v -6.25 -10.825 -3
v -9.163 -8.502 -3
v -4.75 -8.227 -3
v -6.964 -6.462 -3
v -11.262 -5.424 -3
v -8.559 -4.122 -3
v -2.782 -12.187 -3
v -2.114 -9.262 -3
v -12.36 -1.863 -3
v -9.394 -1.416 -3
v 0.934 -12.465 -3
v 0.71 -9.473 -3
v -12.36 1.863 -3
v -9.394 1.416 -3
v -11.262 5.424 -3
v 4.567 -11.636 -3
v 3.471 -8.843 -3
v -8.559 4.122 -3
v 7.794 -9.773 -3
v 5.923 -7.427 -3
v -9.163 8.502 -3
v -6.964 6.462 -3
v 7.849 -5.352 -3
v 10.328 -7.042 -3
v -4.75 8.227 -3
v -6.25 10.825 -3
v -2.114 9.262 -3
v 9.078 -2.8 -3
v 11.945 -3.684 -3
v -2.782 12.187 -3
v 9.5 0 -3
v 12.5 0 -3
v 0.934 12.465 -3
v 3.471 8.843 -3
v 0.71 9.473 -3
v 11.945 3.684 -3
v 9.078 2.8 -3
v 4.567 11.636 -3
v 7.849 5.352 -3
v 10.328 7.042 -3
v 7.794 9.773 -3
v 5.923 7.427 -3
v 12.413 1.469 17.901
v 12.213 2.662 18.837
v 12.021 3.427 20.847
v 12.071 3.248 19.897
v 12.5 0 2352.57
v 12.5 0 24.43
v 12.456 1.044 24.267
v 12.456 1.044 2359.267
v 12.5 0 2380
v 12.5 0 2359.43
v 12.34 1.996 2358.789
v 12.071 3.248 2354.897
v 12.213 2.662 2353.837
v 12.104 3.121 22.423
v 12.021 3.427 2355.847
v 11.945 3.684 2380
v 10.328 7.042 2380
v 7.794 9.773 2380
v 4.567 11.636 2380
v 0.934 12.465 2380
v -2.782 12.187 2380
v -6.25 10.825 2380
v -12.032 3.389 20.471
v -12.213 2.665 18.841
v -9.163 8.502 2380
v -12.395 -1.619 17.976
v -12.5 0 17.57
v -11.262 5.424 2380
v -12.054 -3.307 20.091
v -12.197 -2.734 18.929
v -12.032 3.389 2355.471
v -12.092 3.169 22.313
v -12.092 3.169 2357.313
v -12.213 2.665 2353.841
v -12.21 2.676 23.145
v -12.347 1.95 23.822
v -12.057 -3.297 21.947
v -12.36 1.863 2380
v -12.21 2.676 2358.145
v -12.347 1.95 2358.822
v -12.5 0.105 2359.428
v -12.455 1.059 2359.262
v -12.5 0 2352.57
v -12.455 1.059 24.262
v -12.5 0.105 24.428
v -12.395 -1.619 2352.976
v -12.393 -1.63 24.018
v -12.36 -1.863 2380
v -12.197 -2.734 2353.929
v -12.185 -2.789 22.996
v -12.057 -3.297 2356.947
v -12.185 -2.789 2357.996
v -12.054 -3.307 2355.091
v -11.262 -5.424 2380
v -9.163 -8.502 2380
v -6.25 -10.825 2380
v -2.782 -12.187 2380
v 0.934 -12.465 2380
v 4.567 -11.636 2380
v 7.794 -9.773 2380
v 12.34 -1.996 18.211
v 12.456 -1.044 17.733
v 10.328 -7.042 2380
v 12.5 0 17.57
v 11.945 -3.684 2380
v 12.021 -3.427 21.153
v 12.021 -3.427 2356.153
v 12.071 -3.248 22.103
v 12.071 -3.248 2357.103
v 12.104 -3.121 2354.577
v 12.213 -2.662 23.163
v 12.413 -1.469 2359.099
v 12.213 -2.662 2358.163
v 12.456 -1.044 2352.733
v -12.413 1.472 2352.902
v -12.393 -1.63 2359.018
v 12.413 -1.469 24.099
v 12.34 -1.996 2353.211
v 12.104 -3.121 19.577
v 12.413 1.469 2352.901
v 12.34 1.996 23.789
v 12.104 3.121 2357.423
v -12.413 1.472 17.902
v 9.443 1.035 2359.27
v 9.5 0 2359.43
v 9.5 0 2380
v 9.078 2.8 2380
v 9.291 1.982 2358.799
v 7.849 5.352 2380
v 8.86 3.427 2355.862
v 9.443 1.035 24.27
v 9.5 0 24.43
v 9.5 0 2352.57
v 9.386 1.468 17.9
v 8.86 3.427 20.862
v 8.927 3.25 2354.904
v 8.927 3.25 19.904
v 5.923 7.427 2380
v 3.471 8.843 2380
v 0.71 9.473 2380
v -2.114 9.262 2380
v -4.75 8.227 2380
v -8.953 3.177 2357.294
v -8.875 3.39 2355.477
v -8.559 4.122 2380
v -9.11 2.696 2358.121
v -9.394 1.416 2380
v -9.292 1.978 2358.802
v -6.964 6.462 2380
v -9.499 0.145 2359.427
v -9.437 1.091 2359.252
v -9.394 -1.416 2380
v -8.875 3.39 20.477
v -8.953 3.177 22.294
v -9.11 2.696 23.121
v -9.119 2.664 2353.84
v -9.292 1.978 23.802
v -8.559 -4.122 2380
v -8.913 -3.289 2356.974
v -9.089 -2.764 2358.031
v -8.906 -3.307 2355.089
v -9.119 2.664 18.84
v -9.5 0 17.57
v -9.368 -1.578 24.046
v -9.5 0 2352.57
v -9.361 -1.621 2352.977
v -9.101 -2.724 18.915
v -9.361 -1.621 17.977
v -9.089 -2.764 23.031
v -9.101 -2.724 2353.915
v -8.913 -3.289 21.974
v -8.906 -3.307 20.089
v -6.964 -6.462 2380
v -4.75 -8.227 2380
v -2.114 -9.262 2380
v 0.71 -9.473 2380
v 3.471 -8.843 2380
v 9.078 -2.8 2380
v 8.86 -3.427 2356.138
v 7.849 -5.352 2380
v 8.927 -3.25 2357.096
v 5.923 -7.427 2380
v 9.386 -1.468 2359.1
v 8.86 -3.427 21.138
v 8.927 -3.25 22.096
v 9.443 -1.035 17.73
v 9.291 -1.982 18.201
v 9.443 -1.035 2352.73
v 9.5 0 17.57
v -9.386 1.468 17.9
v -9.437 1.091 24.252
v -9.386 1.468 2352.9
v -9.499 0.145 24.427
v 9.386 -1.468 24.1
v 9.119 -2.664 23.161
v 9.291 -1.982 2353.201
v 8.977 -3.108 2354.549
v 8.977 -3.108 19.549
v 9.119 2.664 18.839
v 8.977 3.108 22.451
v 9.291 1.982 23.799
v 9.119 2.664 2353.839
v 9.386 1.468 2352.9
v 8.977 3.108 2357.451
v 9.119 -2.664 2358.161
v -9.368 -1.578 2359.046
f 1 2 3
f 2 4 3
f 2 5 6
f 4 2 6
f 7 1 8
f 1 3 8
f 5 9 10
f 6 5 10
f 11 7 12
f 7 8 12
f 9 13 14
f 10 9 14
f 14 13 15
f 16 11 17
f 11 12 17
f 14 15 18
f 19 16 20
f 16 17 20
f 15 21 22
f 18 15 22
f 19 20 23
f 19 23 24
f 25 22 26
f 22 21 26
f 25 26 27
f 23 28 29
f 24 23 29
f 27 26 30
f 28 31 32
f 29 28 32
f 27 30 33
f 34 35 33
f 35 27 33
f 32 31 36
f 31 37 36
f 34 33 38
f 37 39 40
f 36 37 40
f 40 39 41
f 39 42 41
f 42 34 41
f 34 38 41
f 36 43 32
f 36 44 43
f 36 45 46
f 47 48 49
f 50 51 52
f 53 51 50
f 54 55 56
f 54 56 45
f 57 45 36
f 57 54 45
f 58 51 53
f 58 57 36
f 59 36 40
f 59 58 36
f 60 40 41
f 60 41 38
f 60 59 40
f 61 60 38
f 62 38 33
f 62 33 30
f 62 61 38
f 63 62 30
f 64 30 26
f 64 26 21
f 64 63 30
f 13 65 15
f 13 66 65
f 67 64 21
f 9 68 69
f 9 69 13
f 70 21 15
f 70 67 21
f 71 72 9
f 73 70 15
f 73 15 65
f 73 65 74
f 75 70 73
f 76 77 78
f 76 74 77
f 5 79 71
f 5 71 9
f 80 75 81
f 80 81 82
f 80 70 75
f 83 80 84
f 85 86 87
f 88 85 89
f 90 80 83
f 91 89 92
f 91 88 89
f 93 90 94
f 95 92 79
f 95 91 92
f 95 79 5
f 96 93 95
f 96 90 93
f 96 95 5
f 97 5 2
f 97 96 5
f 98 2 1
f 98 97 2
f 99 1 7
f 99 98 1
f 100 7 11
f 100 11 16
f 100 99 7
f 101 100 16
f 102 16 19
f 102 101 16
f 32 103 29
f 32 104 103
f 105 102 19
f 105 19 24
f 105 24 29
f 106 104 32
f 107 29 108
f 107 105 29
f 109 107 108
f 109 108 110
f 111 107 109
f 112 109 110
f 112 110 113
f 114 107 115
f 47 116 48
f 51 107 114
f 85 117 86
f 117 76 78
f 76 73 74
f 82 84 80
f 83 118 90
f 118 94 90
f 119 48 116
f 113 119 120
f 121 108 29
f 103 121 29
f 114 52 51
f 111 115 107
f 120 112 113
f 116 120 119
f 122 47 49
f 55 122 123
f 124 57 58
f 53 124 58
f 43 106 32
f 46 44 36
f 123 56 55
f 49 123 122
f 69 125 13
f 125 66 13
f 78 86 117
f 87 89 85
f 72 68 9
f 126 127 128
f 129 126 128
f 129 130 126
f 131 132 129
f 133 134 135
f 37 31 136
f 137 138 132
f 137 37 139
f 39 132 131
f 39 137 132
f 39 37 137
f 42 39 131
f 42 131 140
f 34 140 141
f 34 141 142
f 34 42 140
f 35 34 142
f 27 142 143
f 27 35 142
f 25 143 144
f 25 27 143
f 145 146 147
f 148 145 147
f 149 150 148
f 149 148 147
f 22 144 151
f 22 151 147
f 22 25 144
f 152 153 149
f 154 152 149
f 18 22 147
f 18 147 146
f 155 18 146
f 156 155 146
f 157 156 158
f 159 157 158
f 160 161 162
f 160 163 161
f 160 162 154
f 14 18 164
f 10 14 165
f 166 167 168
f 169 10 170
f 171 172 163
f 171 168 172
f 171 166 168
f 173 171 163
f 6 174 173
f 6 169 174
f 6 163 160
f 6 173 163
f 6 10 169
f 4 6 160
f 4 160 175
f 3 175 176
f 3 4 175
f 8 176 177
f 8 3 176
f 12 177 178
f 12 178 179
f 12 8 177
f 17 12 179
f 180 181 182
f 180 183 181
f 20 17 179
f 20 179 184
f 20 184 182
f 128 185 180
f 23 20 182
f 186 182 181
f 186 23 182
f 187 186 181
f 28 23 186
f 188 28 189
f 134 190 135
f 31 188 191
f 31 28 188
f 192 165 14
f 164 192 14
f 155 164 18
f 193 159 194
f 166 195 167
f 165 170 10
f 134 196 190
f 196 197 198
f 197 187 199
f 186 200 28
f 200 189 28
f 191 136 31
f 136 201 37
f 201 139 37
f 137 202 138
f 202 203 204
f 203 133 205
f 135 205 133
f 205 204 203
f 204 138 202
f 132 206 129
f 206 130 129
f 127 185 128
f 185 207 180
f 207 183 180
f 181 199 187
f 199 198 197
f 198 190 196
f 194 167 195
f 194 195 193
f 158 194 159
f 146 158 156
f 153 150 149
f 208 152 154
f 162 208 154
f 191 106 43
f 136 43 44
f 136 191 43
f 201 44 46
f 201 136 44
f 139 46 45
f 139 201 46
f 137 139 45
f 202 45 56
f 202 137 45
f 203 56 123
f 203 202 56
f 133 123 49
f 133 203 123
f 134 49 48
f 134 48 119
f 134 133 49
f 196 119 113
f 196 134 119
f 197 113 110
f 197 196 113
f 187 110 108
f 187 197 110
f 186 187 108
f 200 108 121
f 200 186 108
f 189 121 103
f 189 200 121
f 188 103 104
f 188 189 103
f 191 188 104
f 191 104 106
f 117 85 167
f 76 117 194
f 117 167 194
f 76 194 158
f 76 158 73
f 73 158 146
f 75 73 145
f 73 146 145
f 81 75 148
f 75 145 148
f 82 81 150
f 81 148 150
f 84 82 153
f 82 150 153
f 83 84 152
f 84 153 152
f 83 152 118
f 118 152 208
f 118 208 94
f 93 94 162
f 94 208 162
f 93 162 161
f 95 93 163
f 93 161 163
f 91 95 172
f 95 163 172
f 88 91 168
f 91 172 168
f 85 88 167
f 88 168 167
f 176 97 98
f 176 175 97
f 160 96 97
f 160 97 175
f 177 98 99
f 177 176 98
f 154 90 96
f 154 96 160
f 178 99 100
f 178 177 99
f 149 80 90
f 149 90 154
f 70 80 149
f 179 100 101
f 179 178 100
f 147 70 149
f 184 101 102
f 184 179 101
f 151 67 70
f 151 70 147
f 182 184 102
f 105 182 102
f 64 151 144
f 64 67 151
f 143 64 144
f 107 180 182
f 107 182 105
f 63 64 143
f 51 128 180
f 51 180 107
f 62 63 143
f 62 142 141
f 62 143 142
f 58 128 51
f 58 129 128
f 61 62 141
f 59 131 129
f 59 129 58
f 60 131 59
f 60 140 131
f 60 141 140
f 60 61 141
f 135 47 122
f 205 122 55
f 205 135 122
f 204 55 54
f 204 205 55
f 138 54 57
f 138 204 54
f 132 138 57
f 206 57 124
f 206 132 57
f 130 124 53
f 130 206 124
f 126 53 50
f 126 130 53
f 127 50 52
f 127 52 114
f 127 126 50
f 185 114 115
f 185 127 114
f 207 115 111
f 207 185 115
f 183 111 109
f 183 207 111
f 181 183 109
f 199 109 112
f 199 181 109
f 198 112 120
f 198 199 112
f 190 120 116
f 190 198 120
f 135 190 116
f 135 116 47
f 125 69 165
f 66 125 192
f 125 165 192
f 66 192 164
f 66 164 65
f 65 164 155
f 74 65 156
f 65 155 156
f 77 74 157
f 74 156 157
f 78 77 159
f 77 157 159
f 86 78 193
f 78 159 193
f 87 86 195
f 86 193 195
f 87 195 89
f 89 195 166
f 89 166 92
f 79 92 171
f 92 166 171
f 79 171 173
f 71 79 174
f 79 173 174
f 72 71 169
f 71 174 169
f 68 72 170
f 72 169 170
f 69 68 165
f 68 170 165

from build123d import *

# Parameters (mm, degrees)
CROQUIS1_R                   = 12.5
CROQUIS1_R_2                 = 9.5
SALIENTE_EXTRUIR1_DEPTH      = 2380
SALIENTE_EXTRUIR1_DEPTH_BACK = 3
CROQUIS2_R                   = 3.43
CORTAR_EXTRUIR1_DEPTH        = 13.5
CORTAR_EXTRUIR1_DEPTH_BACK   = 13.5
CROQUIS3_R                   = 3.43
CORTAR_EXTRUIR2_DEPTH        = 13.5000001
CORTAR_EXTRUIR2_DEPTH_BACK   = 13.5000001


with BuildPart() as part:
    # Croquis1 → Saliente-Extruir1 (new body, two sides)
    with BuildSketch(Plane.XY) as saliente_extruir1_sk:
        Circle(CROQUIS1_R)
        Circle(CROQUIS1_R_2, mode=Mode.SUBTRACT)
    extrude(amount=SALIENTE_EXTRUIR1_DEPTH)
    extrude(saliente_extruir1_sk.sketch, amount=-SALIENTE_EXTRUIR1_DEPTH_BACK)

    # Croquis2 → Cortar-Extruir1 (cut, two sides)
    with BuildSketch(Plane(origin=(0, 0, 0), x_dir=(0, 0, -1), z_dir=(1, 0, 0))) as cortar_extruir1_sk:
        with Locations((-21, 0)):
            Circle(CROQUIS2_R)
    extrude(amount=CORTAR_EXTRUIR1_DEPTH, mode=Mode.SUBTRACT)
    extrude(cortar_extruir1_sk.sketch, amount=-CORTAR_EXTRUIR1_DEPTH_BACK, mode=Mode.SUBTRACT)

    # Croquis3 → Cortar-Extruir2 (cut, two sides)
    with BuildSketch(Plane(origin=(0, 0, 0), x_dir=(0, 0, -1), z_dir=(1, 0, 0))) as cortar_extruir2_sk:
        with Locations((-2356, 0)):
            Circle(CROQUIS3_R)
    extrude(amount=CORTAR_EXTRUIR2_DEPTH, mode=Mode.SUBTRACT)
    extrude(cortar_extruir2_sk.sketch, amount=-CORTAR_EXTRUIR2_DEPTH_BACK, mode=Mode.SUBTRACT)


solid = part.part
